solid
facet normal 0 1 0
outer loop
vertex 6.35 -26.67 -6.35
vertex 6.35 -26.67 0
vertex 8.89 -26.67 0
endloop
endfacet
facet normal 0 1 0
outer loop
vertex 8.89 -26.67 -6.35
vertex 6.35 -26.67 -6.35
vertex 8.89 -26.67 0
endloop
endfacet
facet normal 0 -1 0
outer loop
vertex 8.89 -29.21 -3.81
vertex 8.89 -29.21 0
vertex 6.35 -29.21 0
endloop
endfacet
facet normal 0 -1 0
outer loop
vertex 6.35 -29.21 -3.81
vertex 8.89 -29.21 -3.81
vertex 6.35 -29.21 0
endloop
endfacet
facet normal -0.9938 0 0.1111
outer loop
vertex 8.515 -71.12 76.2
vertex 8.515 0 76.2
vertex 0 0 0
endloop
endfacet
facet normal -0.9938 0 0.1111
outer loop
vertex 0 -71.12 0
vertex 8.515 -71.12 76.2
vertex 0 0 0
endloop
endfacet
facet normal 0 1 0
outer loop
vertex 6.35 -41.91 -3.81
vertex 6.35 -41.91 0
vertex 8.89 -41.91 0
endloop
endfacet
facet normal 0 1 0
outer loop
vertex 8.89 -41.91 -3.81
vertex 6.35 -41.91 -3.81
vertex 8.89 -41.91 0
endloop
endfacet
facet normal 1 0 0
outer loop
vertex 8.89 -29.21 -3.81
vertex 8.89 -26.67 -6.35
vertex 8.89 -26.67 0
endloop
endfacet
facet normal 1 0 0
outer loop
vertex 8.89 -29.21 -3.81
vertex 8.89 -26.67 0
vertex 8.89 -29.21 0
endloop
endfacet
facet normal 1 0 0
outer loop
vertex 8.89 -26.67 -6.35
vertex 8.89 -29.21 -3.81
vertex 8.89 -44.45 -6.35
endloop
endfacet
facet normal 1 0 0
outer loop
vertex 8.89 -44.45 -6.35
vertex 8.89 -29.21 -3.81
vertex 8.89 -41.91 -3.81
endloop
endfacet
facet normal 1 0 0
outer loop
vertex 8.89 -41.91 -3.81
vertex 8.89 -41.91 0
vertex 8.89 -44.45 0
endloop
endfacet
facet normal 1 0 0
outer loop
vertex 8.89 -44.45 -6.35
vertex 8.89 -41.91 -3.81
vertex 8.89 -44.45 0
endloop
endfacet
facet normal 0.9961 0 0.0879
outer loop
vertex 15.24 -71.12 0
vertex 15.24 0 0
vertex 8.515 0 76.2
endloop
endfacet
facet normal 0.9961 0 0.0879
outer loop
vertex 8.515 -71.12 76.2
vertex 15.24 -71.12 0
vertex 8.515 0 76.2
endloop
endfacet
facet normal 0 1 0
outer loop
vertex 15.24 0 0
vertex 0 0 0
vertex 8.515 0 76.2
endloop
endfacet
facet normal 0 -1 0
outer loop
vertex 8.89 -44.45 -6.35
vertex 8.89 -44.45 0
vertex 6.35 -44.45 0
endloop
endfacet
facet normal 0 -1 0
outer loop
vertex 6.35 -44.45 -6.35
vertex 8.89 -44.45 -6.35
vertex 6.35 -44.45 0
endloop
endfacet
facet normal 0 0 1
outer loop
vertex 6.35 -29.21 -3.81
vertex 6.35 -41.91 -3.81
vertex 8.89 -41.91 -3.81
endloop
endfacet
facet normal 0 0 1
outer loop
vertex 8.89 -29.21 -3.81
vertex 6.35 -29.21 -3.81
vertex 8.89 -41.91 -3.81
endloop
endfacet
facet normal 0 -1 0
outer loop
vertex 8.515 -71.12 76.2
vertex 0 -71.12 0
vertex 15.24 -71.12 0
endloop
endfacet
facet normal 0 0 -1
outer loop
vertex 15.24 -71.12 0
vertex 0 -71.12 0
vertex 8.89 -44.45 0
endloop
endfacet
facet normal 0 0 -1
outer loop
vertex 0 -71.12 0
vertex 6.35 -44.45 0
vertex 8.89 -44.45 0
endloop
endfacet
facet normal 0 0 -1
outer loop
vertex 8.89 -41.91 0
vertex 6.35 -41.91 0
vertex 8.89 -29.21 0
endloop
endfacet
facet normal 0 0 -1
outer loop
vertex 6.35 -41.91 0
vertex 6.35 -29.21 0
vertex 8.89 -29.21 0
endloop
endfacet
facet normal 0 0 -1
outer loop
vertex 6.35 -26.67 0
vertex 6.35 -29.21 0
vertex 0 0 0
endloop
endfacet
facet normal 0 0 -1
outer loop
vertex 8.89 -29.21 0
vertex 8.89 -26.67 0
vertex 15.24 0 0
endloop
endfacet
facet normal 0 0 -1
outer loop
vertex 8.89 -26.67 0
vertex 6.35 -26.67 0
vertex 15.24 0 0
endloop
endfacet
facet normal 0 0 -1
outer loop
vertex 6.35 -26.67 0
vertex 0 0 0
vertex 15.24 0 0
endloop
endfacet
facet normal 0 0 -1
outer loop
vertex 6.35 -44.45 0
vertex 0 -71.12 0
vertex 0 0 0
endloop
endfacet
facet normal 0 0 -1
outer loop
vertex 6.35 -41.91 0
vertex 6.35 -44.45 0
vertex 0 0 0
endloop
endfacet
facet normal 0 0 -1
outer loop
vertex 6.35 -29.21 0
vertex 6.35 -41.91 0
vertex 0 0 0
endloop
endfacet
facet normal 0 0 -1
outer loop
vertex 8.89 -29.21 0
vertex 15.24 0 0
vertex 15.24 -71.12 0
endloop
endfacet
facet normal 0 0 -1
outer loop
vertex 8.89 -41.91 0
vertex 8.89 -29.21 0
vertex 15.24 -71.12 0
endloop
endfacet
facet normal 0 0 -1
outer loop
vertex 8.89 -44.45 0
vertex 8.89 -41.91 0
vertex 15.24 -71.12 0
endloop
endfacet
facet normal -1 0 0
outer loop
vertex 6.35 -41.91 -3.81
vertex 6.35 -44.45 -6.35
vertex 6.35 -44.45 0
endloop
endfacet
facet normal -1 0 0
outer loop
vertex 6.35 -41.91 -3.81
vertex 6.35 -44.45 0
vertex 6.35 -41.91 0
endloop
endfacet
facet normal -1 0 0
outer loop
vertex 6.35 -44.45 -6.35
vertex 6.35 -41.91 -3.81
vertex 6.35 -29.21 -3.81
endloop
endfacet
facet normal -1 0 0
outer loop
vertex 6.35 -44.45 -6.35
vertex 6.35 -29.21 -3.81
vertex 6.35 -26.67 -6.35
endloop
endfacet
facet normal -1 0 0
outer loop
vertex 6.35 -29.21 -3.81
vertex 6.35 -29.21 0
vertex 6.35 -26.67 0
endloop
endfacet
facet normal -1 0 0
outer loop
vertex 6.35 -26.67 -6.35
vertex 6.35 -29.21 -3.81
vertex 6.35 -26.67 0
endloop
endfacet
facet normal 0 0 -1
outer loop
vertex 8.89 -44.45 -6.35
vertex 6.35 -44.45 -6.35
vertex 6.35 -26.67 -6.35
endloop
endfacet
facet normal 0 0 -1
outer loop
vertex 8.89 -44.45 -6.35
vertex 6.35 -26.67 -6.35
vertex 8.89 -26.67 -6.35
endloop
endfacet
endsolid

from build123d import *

# Parameters (mm, degrees)
F1_DEPTH = 71.12
F2_W     = 1.27
F2_H     = 1.27
F3_DEPTH = 6.35
F4_W     = 2.54
F4_H     = 2.54
F5_DEPTH = 17.77746


with BuildPart() as f1:
    # F0 (on Front) → F1 (new body)
    with BuildSketch(Plane.XZ):
        Polygon((8.5148252547, 76.2), (0, 0), (15.24, 0), align=None)
    extrude(amount=F1_DEPTH)

    # F2 (on face) → F3 (join)
    with BuildSketch(Plane(origin=(0, 0, 0), x_dir=(1, 0, 0), z_dir=(0, 0, -1))):
        with Locations((8.255, 42.545)):
            Rectangle(F2_W, F2_H)
        with Locations((8.255, 43.815)):
            Rectangle(F2_W, F2_H)
        with Locations((6.985, 43.815)):
            Rectangle(F2_W, F2_H)
        with Locations((6.985, 42.545)):
            Rectangle(F2_W, F2_H)
        with Locations((8.255, 28.575)):
            Rectangle(F2_W, F2_H)
        with Locations((6.985, 28.575)):
            Rectangle(F2_W, F2_H)
        with Locations((6.985, 27.305)):
            Rectangle(F2_W, F2_H)
        with Locations((8.255, 27.305)):
            Rectangle(F2_W, F2_H)
    extrude(amount=F3_DEPTH)

    # F4 (on face) → F5 (join)
    with BuildSketch(Plane.XZ.offset(44.45)):
        with Locations((7.62, -5.08)):
            Rectangle(F4_W, F4_H)
    extrude(amount=-F5_DEPTH)


solid = f1.part
